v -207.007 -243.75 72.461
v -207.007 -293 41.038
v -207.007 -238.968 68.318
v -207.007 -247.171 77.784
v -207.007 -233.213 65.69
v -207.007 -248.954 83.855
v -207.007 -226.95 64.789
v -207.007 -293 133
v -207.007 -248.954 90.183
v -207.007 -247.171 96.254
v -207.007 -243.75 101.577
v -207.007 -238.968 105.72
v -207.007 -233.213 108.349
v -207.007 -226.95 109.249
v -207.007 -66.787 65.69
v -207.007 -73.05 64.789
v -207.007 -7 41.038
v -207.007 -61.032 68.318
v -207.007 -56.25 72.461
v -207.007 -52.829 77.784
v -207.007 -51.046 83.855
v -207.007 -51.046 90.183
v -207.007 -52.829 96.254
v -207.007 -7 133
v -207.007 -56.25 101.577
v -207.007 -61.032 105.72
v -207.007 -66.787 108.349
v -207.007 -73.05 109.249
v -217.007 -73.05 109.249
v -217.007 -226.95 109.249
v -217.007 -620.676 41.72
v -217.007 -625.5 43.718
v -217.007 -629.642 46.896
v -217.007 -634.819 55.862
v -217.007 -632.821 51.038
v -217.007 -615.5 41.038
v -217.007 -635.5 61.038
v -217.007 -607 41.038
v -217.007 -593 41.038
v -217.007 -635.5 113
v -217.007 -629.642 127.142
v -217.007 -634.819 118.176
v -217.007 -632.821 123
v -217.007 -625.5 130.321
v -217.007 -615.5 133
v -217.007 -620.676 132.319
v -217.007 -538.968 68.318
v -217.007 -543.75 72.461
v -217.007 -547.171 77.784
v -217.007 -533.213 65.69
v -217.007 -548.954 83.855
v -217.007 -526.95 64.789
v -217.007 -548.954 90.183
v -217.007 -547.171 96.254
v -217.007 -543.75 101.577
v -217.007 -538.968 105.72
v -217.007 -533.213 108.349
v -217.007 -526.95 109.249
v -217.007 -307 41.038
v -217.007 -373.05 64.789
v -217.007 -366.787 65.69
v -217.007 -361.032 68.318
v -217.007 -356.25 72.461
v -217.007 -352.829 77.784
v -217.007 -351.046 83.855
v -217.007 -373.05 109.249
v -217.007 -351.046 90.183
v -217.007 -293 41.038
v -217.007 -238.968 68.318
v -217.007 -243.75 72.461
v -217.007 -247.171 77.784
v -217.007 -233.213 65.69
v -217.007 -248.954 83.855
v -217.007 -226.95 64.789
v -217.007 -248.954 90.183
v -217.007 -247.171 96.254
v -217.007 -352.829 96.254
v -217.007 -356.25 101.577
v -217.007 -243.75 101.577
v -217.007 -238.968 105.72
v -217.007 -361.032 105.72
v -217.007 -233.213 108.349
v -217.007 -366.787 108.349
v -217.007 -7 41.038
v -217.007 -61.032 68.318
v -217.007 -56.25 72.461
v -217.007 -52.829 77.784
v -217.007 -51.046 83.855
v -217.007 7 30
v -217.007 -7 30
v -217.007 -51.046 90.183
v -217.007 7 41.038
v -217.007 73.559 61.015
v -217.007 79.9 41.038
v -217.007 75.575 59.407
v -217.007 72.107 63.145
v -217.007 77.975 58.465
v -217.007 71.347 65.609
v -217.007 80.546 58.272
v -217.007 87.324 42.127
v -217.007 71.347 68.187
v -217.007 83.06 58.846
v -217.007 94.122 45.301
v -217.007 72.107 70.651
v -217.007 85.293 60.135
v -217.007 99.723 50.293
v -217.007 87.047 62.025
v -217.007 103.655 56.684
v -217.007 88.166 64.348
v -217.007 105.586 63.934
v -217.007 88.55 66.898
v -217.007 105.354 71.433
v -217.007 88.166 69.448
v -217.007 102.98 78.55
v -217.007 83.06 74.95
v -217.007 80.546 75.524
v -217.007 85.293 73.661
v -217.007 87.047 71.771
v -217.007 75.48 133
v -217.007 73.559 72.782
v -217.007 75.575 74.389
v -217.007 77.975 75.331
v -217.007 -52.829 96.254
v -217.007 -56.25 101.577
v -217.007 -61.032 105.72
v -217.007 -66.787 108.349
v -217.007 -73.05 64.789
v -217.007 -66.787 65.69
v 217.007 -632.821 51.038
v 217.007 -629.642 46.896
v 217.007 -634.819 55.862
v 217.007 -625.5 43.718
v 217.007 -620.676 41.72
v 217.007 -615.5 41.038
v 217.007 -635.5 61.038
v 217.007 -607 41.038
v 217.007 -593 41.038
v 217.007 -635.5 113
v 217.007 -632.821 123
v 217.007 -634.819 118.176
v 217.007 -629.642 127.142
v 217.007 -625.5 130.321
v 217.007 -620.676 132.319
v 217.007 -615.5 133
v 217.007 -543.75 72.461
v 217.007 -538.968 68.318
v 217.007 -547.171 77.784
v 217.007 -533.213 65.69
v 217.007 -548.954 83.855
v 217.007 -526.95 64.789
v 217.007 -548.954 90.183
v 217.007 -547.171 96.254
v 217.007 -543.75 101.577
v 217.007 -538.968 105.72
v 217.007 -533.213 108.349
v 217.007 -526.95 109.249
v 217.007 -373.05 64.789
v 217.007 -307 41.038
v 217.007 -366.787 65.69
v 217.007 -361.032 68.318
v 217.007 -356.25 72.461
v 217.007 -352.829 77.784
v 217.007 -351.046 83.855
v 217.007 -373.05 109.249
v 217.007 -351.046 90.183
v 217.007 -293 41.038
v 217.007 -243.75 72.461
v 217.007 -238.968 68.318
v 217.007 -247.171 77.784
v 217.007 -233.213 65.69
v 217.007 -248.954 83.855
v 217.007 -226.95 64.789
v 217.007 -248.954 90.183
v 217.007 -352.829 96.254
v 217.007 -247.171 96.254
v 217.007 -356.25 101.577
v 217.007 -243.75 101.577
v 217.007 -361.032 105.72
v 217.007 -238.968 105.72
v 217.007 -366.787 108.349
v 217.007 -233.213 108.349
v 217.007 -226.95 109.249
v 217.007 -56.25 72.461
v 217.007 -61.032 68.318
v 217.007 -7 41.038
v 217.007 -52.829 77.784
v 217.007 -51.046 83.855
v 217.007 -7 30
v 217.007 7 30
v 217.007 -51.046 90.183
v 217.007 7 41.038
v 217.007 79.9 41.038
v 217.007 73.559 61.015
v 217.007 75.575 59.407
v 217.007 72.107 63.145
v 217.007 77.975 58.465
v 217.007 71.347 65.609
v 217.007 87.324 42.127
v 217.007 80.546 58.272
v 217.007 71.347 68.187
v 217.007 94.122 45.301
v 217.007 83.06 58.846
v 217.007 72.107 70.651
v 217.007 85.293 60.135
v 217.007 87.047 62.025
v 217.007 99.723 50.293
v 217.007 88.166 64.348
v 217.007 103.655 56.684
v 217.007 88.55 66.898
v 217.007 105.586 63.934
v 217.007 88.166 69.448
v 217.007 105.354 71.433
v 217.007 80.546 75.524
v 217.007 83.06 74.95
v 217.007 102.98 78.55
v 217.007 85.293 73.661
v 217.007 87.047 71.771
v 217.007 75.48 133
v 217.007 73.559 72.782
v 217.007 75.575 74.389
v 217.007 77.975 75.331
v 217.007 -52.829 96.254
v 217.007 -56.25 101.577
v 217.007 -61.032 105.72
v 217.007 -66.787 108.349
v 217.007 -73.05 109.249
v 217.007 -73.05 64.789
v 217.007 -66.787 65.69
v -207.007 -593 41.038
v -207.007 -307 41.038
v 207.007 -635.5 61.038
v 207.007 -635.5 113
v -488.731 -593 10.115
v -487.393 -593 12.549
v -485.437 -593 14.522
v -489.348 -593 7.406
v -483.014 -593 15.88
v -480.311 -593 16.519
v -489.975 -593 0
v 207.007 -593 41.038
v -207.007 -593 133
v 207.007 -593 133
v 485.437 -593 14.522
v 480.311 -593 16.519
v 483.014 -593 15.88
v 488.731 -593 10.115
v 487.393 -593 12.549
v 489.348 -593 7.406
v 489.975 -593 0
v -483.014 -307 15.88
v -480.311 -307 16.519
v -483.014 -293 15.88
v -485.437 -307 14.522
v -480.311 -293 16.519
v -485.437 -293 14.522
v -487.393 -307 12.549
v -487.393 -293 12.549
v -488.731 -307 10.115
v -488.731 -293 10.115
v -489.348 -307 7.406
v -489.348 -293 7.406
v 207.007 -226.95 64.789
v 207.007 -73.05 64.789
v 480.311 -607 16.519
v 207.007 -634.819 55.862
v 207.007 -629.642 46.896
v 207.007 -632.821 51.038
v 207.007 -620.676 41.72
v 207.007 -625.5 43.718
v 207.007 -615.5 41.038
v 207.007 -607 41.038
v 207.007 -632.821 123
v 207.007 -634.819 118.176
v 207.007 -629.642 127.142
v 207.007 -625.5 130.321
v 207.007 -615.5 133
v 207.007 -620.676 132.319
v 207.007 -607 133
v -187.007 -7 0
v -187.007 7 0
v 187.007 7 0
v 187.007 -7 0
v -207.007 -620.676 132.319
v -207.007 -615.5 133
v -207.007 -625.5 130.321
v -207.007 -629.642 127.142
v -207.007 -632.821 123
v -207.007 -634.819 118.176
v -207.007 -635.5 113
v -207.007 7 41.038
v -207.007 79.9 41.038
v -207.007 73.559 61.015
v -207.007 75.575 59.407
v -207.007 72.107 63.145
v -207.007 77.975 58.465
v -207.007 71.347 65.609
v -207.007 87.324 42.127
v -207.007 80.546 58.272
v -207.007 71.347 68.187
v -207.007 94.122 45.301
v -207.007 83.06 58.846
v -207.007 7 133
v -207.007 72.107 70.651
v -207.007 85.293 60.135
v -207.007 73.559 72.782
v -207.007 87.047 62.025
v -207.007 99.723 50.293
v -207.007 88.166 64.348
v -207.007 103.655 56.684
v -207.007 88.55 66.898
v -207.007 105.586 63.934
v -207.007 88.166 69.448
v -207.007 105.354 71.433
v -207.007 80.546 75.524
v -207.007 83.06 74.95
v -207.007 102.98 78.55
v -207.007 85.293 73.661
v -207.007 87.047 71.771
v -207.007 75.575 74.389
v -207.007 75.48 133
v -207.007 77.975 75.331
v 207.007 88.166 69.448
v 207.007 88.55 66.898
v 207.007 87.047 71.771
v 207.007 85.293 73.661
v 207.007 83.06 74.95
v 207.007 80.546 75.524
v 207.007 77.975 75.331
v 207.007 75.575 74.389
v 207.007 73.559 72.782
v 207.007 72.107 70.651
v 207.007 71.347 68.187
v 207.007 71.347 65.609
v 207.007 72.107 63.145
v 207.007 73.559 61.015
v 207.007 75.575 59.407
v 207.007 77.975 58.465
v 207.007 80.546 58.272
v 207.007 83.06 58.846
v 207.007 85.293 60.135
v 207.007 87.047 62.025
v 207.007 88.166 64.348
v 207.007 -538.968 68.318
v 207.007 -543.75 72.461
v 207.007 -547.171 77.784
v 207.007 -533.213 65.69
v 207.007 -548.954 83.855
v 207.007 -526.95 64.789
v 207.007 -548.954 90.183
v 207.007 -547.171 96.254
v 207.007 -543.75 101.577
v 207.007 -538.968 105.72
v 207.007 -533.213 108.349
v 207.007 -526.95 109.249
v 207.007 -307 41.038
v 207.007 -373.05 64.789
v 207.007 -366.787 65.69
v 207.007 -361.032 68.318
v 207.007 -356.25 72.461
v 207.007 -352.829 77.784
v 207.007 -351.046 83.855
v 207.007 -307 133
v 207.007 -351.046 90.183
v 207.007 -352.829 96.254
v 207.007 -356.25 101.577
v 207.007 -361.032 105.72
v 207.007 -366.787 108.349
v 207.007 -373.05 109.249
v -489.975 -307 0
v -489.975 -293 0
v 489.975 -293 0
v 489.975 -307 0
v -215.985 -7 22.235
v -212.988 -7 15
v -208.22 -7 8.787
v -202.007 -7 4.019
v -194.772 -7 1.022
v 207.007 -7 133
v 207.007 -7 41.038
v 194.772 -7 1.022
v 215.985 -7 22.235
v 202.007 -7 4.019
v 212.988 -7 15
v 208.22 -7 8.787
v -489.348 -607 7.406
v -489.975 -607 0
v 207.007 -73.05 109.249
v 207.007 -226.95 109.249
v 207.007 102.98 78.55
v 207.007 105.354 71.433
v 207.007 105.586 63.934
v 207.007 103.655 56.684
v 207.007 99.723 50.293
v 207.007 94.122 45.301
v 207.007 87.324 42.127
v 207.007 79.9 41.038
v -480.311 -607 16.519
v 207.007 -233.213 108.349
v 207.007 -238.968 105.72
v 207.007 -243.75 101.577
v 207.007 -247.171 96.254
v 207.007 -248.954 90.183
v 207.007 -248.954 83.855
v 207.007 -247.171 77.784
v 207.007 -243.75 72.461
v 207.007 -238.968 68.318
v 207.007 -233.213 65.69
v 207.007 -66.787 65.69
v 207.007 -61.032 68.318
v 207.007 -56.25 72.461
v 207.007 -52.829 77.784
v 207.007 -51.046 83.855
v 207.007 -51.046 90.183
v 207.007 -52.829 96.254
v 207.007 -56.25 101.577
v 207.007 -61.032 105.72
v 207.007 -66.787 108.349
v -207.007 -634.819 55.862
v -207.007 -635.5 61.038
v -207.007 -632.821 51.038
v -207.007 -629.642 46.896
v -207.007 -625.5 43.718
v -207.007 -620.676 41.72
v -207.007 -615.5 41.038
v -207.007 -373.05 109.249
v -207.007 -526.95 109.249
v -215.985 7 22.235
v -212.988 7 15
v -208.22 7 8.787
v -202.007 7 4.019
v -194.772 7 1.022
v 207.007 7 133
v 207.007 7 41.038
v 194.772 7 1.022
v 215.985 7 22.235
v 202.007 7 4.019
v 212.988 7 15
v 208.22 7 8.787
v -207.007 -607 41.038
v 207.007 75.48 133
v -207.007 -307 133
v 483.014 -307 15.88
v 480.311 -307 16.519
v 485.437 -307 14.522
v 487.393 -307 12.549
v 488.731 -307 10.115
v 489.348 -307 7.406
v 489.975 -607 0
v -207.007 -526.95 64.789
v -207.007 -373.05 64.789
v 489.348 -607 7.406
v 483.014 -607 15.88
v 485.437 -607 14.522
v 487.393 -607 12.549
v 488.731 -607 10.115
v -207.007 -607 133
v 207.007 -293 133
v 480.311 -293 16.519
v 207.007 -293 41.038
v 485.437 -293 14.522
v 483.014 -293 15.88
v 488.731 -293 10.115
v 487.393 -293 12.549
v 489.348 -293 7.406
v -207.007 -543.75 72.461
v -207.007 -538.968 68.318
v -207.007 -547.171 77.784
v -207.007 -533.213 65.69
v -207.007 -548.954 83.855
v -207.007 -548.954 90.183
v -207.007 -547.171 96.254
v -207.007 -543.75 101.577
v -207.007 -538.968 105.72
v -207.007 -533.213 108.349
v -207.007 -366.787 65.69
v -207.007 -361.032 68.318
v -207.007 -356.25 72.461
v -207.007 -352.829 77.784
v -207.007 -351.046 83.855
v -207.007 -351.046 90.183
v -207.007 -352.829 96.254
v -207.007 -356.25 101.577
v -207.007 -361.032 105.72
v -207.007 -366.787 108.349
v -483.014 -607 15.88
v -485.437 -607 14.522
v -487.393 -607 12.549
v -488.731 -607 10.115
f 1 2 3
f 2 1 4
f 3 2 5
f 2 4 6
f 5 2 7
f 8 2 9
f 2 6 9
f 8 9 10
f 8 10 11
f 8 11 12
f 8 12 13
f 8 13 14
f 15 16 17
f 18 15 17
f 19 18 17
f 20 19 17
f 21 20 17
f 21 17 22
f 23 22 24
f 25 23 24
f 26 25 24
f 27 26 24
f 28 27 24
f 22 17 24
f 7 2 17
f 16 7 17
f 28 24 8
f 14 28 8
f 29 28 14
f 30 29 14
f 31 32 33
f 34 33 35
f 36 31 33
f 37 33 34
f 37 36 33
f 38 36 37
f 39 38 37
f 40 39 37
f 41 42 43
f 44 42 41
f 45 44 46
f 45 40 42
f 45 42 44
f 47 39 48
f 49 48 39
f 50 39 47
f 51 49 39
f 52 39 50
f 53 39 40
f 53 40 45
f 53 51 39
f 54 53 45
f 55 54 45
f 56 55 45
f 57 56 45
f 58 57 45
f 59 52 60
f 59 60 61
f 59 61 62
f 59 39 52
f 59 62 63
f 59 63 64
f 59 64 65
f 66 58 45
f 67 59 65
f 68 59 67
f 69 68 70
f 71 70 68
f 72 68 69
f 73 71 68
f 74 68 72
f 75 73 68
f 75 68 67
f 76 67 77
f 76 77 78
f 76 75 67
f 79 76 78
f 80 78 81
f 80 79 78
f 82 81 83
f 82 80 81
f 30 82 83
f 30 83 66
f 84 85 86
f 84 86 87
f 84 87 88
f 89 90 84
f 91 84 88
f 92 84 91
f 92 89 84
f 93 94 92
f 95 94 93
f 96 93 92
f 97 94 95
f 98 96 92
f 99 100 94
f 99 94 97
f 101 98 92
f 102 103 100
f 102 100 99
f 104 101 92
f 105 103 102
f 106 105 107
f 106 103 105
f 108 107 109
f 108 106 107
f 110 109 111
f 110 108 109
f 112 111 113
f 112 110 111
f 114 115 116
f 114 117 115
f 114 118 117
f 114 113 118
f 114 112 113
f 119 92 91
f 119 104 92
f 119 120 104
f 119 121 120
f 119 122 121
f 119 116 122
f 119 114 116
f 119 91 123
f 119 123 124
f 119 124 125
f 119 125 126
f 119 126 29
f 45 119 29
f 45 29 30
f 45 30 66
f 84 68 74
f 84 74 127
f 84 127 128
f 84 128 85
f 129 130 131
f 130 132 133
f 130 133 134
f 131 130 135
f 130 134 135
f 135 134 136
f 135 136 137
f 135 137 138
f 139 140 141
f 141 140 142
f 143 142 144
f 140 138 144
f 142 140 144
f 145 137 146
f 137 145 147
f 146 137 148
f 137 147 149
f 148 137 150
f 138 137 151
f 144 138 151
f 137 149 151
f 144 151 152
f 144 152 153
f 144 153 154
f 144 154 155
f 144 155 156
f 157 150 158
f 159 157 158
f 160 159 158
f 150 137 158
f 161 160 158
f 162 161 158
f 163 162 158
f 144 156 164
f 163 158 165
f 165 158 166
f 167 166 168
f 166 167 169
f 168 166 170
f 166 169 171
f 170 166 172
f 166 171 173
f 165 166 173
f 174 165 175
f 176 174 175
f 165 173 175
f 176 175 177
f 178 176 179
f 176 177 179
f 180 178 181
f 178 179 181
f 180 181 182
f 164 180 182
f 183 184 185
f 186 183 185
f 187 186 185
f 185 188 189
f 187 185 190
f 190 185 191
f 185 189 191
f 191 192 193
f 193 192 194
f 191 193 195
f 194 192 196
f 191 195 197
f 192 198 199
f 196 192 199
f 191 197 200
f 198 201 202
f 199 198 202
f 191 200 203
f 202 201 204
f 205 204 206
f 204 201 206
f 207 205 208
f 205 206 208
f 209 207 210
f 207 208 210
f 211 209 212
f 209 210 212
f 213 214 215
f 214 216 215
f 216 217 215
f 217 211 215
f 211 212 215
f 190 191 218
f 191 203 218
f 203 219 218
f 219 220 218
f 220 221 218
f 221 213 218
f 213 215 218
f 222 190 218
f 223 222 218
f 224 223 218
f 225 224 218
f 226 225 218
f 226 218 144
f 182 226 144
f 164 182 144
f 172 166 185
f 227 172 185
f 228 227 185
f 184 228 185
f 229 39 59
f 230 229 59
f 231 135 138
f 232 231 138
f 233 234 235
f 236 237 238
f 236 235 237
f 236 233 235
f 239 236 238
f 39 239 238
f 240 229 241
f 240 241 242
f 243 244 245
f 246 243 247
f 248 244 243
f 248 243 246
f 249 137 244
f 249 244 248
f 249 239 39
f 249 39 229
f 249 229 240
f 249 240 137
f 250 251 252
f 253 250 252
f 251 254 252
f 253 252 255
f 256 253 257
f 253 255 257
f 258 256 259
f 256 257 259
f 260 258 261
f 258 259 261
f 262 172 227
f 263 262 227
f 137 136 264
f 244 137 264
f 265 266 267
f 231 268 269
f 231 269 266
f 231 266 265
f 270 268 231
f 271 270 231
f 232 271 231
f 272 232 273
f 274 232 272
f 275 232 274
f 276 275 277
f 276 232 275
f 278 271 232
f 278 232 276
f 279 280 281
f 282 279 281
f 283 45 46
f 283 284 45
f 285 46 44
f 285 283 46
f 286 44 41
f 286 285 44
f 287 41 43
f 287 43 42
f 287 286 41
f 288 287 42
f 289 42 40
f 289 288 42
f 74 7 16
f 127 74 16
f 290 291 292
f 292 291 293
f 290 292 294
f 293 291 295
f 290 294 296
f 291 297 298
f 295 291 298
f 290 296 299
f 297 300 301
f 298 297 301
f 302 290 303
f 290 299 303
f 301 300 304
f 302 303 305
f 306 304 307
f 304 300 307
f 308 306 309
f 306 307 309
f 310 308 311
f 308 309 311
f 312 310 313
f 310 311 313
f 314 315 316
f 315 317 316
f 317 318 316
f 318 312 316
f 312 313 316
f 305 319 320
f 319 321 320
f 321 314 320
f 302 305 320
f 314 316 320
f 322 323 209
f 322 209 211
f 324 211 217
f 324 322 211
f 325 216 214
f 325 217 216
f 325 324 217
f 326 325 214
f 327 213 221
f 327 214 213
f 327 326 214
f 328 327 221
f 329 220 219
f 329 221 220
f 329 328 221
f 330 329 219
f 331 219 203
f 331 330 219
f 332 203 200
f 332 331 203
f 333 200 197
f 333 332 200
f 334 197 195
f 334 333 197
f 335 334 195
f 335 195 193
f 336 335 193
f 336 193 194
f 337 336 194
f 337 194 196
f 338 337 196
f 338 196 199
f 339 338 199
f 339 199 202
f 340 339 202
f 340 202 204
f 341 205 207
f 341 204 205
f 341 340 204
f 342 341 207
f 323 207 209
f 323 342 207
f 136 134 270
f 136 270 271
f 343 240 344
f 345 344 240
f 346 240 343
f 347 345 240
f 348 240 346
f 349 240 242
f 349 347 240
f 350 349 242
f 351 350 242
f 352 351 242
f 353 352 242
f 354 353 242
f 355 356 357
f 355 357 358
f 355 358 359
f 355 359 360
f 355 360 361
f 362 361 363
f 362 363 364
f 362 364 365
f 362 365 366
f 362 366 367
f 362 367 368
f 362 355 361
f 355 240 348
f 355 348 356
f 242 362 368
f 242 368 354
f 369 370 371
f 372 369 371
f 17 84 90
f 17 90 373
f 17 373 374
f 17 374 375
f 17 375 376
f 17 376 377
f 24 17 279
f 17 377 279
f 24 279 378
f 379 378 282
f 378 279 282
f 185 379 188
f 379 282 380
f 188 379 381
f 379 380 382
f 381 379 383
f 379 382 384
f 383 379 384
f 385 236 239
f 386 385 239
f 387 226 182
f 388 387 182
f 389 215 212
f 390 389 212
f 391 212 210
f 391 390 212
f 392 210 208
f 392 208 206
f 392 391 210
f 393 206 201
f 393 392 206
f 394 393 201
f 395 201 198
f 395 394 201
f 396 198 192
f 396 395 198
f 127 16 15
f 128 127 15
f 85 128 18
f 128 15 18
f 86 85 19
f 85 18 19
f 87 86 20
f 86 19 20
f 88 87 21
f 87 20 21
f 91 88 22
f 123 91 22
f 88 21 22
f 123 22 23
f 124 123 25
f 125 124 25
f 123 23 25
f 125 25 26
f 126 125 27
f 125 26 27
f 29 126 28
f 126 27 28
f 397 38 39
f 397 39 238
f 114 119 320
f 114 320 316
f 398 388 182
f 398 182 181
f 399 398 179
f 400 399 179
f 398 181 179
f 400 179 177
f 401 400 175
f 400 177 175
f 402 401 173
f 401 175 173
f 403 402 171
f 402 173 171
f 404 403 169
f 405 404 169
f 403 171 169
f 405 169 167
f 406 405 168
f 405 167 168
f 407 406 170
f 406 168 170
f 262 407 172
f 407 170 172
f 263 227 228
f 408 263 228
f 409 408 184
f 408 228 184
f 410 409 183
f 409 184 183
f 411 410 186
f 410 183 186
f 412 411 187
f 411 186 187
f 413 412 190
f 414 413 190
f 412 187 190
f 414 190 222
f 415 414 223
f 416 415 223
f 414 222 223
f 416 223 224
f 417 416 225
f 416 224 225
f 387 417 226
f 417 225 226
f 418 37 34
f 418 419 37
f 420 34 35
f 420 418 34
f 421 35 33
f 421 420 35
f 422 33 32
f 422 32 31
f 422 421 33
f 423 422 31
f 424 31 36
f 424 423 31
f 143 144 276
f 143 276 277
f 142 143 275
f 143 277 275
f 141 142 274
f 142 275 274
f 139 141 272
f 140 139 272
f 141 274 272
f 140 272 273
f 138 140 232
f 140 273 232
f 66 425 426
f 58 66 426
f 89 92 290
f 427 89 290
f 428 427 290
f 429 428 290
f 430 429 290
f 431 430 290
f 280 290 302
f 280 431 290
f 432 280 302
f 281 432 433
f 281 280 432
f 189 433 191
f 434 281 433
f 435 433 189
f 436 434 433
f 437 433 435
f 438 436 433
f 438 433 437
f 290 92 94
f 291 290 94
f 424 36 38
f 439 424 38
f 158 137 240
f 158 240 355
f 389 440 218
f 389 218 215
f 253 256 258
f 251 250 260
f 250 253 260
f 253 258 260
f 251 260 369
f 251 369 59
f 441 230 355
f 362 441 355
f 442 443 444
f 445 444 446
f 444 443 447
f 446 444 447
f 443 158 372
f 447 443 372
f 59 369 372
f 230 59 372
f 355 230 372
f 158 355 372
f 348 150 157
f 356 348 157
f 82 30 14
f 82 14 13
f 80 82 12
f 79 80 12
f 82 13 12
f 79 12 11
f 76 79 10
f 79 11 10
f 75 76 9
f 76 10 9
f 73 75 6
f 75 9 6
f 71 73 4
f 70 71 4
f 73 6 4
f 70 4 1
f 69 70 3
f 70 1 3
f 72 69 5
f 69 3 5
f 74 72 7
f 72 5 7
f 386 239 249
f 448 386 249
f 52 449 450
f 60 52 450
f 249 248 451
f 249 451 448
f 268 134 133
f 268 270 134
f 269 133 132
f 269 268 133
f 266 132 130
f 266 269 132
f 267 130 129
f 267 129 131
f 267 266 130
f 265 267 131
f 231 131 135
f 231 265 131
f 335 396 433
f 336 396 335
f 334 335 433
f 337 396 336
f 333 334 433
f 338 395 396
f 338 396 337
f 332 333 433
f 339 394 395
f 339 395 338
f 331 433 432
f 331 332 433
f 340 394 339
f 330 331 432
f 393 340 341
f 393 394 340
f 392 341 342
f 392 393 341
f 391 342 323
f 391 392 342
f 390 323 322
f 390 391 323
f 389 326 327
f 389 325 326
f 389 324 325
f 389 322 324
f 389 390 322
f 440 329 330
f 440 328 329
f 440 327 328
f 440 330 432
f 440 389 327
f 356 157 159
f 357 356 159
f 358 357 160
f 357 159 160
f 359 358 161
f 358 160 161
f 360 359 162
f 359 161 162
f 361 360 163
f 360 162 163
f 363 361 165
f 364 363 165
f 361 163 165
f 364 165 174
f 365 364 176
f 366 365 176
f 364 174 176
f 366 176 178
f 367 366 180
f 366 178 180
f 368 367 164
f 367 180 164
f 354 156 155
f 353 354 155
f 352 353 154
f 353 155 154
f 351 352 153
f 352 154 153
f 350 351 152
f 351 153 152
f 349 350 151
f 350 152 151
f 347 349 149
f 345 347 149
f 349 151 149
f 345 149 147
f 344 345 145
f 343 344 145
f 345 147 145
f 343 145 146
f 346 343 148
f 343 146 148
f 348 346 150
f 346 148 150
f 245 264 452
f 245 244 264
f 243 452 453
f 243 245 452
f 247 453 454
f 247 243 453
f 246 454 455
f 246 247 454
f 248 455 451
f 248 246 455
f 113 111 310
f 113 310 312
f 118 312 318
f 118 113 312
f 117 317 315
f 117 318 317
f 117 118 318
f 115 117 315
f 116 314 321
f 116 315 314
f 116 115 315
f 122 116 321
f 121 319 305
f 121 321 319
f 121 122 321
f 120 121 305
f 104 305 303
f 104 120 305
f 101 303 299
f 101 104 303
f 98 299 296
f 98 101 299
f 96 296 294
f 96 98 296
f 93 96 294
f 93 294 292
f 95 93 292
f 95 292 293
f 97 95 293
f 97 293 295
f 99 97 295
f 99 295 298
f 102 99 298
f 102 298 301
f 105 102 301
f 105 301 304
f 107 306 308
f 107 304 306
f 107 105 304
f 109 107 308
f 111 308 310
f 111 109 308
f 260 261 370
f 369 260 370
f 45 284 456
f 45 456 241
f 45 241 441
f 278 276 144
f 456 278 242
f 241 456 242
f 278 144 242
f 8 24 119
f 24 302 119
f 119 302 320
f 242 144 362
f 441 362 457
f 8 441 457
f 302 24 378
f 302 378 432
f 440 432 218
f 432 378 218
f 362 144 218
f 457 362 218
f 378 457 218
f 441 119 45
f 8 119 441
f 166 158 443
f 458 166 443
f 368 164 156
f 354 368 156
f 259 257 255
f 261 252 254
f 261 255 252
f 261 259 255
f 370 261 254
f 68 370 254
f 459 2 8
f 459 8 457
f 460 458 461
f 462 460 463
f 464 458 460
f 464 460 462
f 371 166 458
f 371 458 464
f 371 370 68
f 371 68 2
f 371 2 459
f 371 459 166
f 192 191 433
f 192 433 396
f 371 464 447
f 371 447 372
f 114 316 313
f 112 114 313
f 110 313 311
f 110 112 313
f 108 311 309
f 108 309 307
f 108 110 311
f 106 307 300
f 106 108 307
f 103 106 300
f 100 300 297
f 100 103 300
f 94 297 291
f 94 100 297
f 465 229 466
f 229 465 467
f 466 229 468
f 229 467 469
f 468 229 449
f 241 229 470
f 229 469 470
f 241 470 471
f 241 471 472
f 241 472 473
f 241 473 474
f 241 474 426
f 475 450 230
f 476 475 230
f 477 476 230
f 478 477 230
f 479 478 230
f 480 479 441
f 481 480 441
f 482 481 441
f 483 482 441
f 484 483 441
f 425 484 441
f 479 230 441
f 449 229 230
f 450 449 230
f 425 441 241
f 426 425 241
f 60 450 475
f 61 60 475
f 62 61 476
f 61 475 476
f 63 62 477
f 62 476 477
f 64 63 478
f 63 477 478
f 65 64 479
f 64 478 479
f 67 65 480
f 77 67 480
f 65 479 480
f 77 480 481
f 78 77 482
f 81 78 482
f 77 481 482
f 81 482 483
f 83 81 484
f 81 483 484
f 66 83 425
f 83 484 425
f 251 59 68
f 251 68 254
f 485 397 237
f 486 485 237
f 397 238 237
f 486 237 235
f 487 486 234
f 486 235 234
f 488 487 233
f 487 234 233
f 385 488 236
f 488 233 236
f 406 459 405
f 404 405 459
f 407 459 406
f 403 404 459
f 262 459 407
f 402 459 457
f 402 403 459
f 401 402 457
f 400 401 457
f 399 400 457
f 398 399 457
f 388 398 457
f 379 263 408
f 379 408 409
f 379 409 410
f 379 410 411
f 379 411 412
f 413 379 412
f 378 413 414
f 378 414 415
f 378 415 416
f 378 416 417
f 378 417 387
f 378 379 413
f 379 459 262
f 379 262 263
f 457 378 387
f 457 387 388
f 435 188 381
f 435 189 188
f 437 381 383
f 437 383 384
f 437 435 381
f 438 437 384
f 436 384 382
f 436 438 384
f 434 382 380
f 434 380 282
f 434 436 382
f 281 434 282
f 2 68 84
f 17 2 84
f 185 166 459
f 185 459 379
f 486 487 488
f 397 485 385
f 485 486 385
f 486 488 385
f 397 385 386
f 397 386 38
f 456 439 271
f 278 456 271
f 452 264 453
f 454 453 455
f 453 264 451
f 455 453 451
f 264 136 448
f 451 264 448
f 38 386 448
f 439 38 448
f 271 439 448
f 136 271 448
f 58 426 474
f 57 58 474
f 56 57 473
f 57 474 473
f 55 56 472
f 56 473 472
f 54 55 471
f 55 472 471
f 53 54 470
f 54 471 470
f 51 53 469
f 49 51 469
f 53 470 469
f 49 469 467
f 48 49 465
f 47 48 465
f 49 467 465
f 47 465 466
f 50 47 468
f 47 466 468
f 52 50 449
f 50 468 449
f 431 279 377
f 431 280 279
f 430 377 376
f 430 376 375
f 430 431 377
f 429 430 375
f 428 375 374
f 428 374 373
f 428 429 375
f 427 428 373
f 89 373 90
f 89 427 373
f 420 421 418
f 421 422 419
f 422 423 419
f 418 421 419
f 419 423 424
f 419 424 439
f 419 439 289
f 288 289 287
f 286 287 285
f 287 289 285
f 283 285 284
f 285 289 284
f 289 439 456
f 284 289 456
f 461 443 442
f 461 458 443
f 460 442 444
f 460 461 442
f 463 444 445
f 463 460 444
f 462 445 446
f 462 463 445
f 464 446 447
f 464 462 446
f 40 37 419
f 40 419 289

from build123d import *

# Parameters (mm, degrees)
SKETCH1_W               = 1237.47
SKETCH1_H               = 14
BOSS_EXTRUDE1_DEPTH     = 133
LPATTERN1_COUNT         = 3
LPATTERN1_PITCH         = 300
CUT_EXTRUDE1_DEPTH      = 882.76981136
CUT_EXTRUDE1_DEPTH_BACK = 882.76981136
SKETCH3_W               = 91.96189972
SKETCH3_H               = 741.26
BOSS_EXTRUDE2_DEPTH     = 10
SKETCH4_W               = 289.906679044
SKETCH4_H               = 376.133897458
CUT_EXTRUDE3_DEPTH      = 105
CUT_EXTRUDE5_DEPTH      = 960.881700163
CUT_EXTRUDE5_DEPTH_BACK = 960.881700163
SKETCH5_R               = 8.65
FILLET1_R               = 30
FILLET2_R               = 20
FILLET3_R               = 10
CUT_EXTRUDE6_DEPTH      = 960.881700163
CUT_EXTRUDE6_DEPTH_BACK = 960.881700163


with BuildPart() as part:
    # Sketch1 → Boss-Extrude1 (new body)
    with BuildSketch(Plane.XY):
        Rectangle(SKETCH1_W, SKETCH1_H)
    extrude(amount=BOSS_EXTRUDE1_DEPTH)


with BuildPart() as lpattern1_1:
    # LPattern1: pattern copy
    add(part.part.moved(Location(Vector(0, -1, 0) * (1 * LPATTERN1_PITCH))))


with BuildPart() as lpattern1_2:
    # LPattern1: pattern copy
    add(part.part.moved(Location(Vector(0, -1, 0) * (2 * LPATTERN1_PITCH))))


with BuildPart() as cut_extrude1_tool:
    # Sketch2 → Cut-Extrude1 (new, two sides: drawn at the far end of the back side and taken through both)
    with BuildSketch(Plane(origin=(0, 7, 0), x_dir=(1, 0, 0), z_dir=(0, 1, 0)).offset(-CUT_EXTRUDE1_DEPTH_BACK)):
        Polygon((-675.17481683, 0), (-675.17481683, -133), (-217.007056567, -133), (-217.007056567, -41.03810028), (-488.641898603, -15.743660333), (-489.975, 0), align=None)
        Polygon((489.975, 0), (675.17481683, 0), (675.17481683, -133), (217.007056567, -133), (217.007056567, -41.03810028), (488.641898603, -15.743660333), align=None)
    extrude(amount=CUT_EXTRUDE1_DEPTH + CUT_EXTRUDE1_DEPTH_BACK)


with BuildPart() as part_1:
    add(part.part)

    # Cut-Extrude1: cut by cut_extrude1_tool
    add(cut_extrude1_tool.part, mode=Mode.SUBTRACT)



with BuildPart() as lpattern1_1_1:
    add(lpattern1_1.part)

    # Cut-Extrude1: cut by cut_extrude1_tool
    add(cut_extrude1_tool.part, mode=Mode.SUBTRACT)


with BuildPart() as lpattern1_2_1:
    add(lpattern1_2.part)

    # Cut-Extrude1: cut by cut_extrude1_tool
    add(cut_extrude1_tool.part, mode=Mode.SUBTRACT)


with BuildPart() as part_2:
    add(part_1.part)

    add(lpattern1_1_1.part)  # Boss-Extrude2 merges LPattern1_1

    add(lpattern1_2_1.part)  # Boss-Extrude2 merges LPattern1_2
    # Sketch3 → Boss-Extrude2 (add)
    with BuildSketch(Plane.ZY.offset(217.007056567)):
        with Locations((87.01905014, -264.87)):
            Rectangle(SKETCH3_W, SKETCH3_H)
    boss_extrude2 = extrude(amount=-BOSS_EXTRUDE2_DEPTH)

    # Mirror1: Boss-Extrude2 across plane
    add(boss_extrude2.mirror(Plane(origin=(0, 0, 0), x_dir=(0, 0, 1), z_dir=(1, 0, 0))))

    # Sketch4 → Cut-Extrude3 (cut)
    with BuildSketch(Plane(origin=(0, 7, 0), x_dir=(1, 0, 0), z_dir=(0, 1, 0))):
        with Locations((-361.960396089, -44.135281773)):
            Rectangle(SKETCH4_W, SKETCH4_H)
        with Locations((361.960396089, -44.135281773)):
            Rectangle(SKETCH4_W, SKETCH4_H)
    extrude(amount=-CUT_EXTRUDE3_DEPTH, mode=Mode.SUBTRACT)

    # Sketch5 → Cut-Extrude5 (cut, two sides: drawn at the far end of the back side and taken through both)
    with BuildSketch(Plane(origin=(217.007056567, 0, 0), x_dir=(0, 0, -1), z_dir=(1, 0, 0)).offset(-CUT_EXTRUDE5_DEPTH_BACK)):
        with BuildLine():
            Line((-133, 105.76), (-133, 75.48))
            Line((-133, 75.48), (-78.550242405, 102.979525411))
            ThreePointArc((-78.550242405, 102.979525411), (-53.345094409, 101.921723933), (-41.03810028, 79.9))
            Line((-41.03810028, 79.9), (-41.03810028, 105.76))
            Line((-41.03810028, 105.76), (-133, 105.76))
        make_face()
        with Locations(Location((-66.89810028, 79.9, 0), (0, 0, 90))):
            Circle(SKETCH5_R)
    extrude(amount=CUT_EXTRUDE5_DEPTH + CUT_EXTRUDE5_DEPTH_BACK, mode=Mode.SUBTRACT)

    # Fillet1
    fillet1_edges = [part_2.edges().sort_by_distance(p)[0] for p in [
        (-217.007056567, 0, 0),
        (217.007056567, 0, 0),
    ]]
    fillet(fillet1_edges, radius=FILLET1_R)

    # Fillet2
    fillet2_edges = [part_2.edges().sort_by_distance(p)[0] for p in [
        (212.007056567, -635.5, 133),
        (212.007056567, -635.5, 41.03810028),
        (-212.007056567, -635.5, 41.03810028),
        (-212.007056567, -635.5, 133),
    ]]
    fillet(fillet2_edges, radius=FILLET2_R)

    # Fillet3
    fillet3_edges = [part_2.edges().sort_by_distance(p)[0] for p in [
        (488.641898603, -300, 15.743660333),
        (-488.641898603, -300, 15.743660333),
        (488.641898603, -600, 15.743660333),
        (-488.641898603, -600, 15.743660333),
    ]]
    fillet(fillet3_edges, radius=FILLET3_R)

    # Sketch6 → Cut-Extrude6 (cut, two sides: drawn at the far end of the back side and taken through both)
    with BuildSketch(Plane.ZY.offset(217.007056567).offset(-CUT_EXTRUDE6_DEPTH_BACK)):
        with BuildLine():
            Line((109.24905014, -73.05), (109.24905014, -226.95))
            ThreePointArc((109.24905014, -226.95), (87.01905014, -249.18), (64.78905014, -226.95))
            Line((64.78905014, -226.95), (64.78905014, -73.05))
            ThreePointArc((64.78905014, -73.05), (87.01905014, -50.82), (109.24905014, -73.05))
        make_face()
        with BuildLine():
            Line((109.24905014, -373.05), (109.24905014, -526.95))
            ThreePointArc((109.24905014, -526.95), (87.01905014, -549.18), (64.78905014, -526.95))
            Line((64.78905014, -526.95), (64.78905014, -373.05))
            ThreePointArc((64.78905014, -373.05), (87.01905014, -350.82), (109.24905014, -373.05))
        make_face()
    extrude(amount=CUT_EXTRUDE6_DEPTH + CUT_EXTRUDE6_DEPTH_BACK, mode=Mode.SUBTRACT)


solid = part_2.part
